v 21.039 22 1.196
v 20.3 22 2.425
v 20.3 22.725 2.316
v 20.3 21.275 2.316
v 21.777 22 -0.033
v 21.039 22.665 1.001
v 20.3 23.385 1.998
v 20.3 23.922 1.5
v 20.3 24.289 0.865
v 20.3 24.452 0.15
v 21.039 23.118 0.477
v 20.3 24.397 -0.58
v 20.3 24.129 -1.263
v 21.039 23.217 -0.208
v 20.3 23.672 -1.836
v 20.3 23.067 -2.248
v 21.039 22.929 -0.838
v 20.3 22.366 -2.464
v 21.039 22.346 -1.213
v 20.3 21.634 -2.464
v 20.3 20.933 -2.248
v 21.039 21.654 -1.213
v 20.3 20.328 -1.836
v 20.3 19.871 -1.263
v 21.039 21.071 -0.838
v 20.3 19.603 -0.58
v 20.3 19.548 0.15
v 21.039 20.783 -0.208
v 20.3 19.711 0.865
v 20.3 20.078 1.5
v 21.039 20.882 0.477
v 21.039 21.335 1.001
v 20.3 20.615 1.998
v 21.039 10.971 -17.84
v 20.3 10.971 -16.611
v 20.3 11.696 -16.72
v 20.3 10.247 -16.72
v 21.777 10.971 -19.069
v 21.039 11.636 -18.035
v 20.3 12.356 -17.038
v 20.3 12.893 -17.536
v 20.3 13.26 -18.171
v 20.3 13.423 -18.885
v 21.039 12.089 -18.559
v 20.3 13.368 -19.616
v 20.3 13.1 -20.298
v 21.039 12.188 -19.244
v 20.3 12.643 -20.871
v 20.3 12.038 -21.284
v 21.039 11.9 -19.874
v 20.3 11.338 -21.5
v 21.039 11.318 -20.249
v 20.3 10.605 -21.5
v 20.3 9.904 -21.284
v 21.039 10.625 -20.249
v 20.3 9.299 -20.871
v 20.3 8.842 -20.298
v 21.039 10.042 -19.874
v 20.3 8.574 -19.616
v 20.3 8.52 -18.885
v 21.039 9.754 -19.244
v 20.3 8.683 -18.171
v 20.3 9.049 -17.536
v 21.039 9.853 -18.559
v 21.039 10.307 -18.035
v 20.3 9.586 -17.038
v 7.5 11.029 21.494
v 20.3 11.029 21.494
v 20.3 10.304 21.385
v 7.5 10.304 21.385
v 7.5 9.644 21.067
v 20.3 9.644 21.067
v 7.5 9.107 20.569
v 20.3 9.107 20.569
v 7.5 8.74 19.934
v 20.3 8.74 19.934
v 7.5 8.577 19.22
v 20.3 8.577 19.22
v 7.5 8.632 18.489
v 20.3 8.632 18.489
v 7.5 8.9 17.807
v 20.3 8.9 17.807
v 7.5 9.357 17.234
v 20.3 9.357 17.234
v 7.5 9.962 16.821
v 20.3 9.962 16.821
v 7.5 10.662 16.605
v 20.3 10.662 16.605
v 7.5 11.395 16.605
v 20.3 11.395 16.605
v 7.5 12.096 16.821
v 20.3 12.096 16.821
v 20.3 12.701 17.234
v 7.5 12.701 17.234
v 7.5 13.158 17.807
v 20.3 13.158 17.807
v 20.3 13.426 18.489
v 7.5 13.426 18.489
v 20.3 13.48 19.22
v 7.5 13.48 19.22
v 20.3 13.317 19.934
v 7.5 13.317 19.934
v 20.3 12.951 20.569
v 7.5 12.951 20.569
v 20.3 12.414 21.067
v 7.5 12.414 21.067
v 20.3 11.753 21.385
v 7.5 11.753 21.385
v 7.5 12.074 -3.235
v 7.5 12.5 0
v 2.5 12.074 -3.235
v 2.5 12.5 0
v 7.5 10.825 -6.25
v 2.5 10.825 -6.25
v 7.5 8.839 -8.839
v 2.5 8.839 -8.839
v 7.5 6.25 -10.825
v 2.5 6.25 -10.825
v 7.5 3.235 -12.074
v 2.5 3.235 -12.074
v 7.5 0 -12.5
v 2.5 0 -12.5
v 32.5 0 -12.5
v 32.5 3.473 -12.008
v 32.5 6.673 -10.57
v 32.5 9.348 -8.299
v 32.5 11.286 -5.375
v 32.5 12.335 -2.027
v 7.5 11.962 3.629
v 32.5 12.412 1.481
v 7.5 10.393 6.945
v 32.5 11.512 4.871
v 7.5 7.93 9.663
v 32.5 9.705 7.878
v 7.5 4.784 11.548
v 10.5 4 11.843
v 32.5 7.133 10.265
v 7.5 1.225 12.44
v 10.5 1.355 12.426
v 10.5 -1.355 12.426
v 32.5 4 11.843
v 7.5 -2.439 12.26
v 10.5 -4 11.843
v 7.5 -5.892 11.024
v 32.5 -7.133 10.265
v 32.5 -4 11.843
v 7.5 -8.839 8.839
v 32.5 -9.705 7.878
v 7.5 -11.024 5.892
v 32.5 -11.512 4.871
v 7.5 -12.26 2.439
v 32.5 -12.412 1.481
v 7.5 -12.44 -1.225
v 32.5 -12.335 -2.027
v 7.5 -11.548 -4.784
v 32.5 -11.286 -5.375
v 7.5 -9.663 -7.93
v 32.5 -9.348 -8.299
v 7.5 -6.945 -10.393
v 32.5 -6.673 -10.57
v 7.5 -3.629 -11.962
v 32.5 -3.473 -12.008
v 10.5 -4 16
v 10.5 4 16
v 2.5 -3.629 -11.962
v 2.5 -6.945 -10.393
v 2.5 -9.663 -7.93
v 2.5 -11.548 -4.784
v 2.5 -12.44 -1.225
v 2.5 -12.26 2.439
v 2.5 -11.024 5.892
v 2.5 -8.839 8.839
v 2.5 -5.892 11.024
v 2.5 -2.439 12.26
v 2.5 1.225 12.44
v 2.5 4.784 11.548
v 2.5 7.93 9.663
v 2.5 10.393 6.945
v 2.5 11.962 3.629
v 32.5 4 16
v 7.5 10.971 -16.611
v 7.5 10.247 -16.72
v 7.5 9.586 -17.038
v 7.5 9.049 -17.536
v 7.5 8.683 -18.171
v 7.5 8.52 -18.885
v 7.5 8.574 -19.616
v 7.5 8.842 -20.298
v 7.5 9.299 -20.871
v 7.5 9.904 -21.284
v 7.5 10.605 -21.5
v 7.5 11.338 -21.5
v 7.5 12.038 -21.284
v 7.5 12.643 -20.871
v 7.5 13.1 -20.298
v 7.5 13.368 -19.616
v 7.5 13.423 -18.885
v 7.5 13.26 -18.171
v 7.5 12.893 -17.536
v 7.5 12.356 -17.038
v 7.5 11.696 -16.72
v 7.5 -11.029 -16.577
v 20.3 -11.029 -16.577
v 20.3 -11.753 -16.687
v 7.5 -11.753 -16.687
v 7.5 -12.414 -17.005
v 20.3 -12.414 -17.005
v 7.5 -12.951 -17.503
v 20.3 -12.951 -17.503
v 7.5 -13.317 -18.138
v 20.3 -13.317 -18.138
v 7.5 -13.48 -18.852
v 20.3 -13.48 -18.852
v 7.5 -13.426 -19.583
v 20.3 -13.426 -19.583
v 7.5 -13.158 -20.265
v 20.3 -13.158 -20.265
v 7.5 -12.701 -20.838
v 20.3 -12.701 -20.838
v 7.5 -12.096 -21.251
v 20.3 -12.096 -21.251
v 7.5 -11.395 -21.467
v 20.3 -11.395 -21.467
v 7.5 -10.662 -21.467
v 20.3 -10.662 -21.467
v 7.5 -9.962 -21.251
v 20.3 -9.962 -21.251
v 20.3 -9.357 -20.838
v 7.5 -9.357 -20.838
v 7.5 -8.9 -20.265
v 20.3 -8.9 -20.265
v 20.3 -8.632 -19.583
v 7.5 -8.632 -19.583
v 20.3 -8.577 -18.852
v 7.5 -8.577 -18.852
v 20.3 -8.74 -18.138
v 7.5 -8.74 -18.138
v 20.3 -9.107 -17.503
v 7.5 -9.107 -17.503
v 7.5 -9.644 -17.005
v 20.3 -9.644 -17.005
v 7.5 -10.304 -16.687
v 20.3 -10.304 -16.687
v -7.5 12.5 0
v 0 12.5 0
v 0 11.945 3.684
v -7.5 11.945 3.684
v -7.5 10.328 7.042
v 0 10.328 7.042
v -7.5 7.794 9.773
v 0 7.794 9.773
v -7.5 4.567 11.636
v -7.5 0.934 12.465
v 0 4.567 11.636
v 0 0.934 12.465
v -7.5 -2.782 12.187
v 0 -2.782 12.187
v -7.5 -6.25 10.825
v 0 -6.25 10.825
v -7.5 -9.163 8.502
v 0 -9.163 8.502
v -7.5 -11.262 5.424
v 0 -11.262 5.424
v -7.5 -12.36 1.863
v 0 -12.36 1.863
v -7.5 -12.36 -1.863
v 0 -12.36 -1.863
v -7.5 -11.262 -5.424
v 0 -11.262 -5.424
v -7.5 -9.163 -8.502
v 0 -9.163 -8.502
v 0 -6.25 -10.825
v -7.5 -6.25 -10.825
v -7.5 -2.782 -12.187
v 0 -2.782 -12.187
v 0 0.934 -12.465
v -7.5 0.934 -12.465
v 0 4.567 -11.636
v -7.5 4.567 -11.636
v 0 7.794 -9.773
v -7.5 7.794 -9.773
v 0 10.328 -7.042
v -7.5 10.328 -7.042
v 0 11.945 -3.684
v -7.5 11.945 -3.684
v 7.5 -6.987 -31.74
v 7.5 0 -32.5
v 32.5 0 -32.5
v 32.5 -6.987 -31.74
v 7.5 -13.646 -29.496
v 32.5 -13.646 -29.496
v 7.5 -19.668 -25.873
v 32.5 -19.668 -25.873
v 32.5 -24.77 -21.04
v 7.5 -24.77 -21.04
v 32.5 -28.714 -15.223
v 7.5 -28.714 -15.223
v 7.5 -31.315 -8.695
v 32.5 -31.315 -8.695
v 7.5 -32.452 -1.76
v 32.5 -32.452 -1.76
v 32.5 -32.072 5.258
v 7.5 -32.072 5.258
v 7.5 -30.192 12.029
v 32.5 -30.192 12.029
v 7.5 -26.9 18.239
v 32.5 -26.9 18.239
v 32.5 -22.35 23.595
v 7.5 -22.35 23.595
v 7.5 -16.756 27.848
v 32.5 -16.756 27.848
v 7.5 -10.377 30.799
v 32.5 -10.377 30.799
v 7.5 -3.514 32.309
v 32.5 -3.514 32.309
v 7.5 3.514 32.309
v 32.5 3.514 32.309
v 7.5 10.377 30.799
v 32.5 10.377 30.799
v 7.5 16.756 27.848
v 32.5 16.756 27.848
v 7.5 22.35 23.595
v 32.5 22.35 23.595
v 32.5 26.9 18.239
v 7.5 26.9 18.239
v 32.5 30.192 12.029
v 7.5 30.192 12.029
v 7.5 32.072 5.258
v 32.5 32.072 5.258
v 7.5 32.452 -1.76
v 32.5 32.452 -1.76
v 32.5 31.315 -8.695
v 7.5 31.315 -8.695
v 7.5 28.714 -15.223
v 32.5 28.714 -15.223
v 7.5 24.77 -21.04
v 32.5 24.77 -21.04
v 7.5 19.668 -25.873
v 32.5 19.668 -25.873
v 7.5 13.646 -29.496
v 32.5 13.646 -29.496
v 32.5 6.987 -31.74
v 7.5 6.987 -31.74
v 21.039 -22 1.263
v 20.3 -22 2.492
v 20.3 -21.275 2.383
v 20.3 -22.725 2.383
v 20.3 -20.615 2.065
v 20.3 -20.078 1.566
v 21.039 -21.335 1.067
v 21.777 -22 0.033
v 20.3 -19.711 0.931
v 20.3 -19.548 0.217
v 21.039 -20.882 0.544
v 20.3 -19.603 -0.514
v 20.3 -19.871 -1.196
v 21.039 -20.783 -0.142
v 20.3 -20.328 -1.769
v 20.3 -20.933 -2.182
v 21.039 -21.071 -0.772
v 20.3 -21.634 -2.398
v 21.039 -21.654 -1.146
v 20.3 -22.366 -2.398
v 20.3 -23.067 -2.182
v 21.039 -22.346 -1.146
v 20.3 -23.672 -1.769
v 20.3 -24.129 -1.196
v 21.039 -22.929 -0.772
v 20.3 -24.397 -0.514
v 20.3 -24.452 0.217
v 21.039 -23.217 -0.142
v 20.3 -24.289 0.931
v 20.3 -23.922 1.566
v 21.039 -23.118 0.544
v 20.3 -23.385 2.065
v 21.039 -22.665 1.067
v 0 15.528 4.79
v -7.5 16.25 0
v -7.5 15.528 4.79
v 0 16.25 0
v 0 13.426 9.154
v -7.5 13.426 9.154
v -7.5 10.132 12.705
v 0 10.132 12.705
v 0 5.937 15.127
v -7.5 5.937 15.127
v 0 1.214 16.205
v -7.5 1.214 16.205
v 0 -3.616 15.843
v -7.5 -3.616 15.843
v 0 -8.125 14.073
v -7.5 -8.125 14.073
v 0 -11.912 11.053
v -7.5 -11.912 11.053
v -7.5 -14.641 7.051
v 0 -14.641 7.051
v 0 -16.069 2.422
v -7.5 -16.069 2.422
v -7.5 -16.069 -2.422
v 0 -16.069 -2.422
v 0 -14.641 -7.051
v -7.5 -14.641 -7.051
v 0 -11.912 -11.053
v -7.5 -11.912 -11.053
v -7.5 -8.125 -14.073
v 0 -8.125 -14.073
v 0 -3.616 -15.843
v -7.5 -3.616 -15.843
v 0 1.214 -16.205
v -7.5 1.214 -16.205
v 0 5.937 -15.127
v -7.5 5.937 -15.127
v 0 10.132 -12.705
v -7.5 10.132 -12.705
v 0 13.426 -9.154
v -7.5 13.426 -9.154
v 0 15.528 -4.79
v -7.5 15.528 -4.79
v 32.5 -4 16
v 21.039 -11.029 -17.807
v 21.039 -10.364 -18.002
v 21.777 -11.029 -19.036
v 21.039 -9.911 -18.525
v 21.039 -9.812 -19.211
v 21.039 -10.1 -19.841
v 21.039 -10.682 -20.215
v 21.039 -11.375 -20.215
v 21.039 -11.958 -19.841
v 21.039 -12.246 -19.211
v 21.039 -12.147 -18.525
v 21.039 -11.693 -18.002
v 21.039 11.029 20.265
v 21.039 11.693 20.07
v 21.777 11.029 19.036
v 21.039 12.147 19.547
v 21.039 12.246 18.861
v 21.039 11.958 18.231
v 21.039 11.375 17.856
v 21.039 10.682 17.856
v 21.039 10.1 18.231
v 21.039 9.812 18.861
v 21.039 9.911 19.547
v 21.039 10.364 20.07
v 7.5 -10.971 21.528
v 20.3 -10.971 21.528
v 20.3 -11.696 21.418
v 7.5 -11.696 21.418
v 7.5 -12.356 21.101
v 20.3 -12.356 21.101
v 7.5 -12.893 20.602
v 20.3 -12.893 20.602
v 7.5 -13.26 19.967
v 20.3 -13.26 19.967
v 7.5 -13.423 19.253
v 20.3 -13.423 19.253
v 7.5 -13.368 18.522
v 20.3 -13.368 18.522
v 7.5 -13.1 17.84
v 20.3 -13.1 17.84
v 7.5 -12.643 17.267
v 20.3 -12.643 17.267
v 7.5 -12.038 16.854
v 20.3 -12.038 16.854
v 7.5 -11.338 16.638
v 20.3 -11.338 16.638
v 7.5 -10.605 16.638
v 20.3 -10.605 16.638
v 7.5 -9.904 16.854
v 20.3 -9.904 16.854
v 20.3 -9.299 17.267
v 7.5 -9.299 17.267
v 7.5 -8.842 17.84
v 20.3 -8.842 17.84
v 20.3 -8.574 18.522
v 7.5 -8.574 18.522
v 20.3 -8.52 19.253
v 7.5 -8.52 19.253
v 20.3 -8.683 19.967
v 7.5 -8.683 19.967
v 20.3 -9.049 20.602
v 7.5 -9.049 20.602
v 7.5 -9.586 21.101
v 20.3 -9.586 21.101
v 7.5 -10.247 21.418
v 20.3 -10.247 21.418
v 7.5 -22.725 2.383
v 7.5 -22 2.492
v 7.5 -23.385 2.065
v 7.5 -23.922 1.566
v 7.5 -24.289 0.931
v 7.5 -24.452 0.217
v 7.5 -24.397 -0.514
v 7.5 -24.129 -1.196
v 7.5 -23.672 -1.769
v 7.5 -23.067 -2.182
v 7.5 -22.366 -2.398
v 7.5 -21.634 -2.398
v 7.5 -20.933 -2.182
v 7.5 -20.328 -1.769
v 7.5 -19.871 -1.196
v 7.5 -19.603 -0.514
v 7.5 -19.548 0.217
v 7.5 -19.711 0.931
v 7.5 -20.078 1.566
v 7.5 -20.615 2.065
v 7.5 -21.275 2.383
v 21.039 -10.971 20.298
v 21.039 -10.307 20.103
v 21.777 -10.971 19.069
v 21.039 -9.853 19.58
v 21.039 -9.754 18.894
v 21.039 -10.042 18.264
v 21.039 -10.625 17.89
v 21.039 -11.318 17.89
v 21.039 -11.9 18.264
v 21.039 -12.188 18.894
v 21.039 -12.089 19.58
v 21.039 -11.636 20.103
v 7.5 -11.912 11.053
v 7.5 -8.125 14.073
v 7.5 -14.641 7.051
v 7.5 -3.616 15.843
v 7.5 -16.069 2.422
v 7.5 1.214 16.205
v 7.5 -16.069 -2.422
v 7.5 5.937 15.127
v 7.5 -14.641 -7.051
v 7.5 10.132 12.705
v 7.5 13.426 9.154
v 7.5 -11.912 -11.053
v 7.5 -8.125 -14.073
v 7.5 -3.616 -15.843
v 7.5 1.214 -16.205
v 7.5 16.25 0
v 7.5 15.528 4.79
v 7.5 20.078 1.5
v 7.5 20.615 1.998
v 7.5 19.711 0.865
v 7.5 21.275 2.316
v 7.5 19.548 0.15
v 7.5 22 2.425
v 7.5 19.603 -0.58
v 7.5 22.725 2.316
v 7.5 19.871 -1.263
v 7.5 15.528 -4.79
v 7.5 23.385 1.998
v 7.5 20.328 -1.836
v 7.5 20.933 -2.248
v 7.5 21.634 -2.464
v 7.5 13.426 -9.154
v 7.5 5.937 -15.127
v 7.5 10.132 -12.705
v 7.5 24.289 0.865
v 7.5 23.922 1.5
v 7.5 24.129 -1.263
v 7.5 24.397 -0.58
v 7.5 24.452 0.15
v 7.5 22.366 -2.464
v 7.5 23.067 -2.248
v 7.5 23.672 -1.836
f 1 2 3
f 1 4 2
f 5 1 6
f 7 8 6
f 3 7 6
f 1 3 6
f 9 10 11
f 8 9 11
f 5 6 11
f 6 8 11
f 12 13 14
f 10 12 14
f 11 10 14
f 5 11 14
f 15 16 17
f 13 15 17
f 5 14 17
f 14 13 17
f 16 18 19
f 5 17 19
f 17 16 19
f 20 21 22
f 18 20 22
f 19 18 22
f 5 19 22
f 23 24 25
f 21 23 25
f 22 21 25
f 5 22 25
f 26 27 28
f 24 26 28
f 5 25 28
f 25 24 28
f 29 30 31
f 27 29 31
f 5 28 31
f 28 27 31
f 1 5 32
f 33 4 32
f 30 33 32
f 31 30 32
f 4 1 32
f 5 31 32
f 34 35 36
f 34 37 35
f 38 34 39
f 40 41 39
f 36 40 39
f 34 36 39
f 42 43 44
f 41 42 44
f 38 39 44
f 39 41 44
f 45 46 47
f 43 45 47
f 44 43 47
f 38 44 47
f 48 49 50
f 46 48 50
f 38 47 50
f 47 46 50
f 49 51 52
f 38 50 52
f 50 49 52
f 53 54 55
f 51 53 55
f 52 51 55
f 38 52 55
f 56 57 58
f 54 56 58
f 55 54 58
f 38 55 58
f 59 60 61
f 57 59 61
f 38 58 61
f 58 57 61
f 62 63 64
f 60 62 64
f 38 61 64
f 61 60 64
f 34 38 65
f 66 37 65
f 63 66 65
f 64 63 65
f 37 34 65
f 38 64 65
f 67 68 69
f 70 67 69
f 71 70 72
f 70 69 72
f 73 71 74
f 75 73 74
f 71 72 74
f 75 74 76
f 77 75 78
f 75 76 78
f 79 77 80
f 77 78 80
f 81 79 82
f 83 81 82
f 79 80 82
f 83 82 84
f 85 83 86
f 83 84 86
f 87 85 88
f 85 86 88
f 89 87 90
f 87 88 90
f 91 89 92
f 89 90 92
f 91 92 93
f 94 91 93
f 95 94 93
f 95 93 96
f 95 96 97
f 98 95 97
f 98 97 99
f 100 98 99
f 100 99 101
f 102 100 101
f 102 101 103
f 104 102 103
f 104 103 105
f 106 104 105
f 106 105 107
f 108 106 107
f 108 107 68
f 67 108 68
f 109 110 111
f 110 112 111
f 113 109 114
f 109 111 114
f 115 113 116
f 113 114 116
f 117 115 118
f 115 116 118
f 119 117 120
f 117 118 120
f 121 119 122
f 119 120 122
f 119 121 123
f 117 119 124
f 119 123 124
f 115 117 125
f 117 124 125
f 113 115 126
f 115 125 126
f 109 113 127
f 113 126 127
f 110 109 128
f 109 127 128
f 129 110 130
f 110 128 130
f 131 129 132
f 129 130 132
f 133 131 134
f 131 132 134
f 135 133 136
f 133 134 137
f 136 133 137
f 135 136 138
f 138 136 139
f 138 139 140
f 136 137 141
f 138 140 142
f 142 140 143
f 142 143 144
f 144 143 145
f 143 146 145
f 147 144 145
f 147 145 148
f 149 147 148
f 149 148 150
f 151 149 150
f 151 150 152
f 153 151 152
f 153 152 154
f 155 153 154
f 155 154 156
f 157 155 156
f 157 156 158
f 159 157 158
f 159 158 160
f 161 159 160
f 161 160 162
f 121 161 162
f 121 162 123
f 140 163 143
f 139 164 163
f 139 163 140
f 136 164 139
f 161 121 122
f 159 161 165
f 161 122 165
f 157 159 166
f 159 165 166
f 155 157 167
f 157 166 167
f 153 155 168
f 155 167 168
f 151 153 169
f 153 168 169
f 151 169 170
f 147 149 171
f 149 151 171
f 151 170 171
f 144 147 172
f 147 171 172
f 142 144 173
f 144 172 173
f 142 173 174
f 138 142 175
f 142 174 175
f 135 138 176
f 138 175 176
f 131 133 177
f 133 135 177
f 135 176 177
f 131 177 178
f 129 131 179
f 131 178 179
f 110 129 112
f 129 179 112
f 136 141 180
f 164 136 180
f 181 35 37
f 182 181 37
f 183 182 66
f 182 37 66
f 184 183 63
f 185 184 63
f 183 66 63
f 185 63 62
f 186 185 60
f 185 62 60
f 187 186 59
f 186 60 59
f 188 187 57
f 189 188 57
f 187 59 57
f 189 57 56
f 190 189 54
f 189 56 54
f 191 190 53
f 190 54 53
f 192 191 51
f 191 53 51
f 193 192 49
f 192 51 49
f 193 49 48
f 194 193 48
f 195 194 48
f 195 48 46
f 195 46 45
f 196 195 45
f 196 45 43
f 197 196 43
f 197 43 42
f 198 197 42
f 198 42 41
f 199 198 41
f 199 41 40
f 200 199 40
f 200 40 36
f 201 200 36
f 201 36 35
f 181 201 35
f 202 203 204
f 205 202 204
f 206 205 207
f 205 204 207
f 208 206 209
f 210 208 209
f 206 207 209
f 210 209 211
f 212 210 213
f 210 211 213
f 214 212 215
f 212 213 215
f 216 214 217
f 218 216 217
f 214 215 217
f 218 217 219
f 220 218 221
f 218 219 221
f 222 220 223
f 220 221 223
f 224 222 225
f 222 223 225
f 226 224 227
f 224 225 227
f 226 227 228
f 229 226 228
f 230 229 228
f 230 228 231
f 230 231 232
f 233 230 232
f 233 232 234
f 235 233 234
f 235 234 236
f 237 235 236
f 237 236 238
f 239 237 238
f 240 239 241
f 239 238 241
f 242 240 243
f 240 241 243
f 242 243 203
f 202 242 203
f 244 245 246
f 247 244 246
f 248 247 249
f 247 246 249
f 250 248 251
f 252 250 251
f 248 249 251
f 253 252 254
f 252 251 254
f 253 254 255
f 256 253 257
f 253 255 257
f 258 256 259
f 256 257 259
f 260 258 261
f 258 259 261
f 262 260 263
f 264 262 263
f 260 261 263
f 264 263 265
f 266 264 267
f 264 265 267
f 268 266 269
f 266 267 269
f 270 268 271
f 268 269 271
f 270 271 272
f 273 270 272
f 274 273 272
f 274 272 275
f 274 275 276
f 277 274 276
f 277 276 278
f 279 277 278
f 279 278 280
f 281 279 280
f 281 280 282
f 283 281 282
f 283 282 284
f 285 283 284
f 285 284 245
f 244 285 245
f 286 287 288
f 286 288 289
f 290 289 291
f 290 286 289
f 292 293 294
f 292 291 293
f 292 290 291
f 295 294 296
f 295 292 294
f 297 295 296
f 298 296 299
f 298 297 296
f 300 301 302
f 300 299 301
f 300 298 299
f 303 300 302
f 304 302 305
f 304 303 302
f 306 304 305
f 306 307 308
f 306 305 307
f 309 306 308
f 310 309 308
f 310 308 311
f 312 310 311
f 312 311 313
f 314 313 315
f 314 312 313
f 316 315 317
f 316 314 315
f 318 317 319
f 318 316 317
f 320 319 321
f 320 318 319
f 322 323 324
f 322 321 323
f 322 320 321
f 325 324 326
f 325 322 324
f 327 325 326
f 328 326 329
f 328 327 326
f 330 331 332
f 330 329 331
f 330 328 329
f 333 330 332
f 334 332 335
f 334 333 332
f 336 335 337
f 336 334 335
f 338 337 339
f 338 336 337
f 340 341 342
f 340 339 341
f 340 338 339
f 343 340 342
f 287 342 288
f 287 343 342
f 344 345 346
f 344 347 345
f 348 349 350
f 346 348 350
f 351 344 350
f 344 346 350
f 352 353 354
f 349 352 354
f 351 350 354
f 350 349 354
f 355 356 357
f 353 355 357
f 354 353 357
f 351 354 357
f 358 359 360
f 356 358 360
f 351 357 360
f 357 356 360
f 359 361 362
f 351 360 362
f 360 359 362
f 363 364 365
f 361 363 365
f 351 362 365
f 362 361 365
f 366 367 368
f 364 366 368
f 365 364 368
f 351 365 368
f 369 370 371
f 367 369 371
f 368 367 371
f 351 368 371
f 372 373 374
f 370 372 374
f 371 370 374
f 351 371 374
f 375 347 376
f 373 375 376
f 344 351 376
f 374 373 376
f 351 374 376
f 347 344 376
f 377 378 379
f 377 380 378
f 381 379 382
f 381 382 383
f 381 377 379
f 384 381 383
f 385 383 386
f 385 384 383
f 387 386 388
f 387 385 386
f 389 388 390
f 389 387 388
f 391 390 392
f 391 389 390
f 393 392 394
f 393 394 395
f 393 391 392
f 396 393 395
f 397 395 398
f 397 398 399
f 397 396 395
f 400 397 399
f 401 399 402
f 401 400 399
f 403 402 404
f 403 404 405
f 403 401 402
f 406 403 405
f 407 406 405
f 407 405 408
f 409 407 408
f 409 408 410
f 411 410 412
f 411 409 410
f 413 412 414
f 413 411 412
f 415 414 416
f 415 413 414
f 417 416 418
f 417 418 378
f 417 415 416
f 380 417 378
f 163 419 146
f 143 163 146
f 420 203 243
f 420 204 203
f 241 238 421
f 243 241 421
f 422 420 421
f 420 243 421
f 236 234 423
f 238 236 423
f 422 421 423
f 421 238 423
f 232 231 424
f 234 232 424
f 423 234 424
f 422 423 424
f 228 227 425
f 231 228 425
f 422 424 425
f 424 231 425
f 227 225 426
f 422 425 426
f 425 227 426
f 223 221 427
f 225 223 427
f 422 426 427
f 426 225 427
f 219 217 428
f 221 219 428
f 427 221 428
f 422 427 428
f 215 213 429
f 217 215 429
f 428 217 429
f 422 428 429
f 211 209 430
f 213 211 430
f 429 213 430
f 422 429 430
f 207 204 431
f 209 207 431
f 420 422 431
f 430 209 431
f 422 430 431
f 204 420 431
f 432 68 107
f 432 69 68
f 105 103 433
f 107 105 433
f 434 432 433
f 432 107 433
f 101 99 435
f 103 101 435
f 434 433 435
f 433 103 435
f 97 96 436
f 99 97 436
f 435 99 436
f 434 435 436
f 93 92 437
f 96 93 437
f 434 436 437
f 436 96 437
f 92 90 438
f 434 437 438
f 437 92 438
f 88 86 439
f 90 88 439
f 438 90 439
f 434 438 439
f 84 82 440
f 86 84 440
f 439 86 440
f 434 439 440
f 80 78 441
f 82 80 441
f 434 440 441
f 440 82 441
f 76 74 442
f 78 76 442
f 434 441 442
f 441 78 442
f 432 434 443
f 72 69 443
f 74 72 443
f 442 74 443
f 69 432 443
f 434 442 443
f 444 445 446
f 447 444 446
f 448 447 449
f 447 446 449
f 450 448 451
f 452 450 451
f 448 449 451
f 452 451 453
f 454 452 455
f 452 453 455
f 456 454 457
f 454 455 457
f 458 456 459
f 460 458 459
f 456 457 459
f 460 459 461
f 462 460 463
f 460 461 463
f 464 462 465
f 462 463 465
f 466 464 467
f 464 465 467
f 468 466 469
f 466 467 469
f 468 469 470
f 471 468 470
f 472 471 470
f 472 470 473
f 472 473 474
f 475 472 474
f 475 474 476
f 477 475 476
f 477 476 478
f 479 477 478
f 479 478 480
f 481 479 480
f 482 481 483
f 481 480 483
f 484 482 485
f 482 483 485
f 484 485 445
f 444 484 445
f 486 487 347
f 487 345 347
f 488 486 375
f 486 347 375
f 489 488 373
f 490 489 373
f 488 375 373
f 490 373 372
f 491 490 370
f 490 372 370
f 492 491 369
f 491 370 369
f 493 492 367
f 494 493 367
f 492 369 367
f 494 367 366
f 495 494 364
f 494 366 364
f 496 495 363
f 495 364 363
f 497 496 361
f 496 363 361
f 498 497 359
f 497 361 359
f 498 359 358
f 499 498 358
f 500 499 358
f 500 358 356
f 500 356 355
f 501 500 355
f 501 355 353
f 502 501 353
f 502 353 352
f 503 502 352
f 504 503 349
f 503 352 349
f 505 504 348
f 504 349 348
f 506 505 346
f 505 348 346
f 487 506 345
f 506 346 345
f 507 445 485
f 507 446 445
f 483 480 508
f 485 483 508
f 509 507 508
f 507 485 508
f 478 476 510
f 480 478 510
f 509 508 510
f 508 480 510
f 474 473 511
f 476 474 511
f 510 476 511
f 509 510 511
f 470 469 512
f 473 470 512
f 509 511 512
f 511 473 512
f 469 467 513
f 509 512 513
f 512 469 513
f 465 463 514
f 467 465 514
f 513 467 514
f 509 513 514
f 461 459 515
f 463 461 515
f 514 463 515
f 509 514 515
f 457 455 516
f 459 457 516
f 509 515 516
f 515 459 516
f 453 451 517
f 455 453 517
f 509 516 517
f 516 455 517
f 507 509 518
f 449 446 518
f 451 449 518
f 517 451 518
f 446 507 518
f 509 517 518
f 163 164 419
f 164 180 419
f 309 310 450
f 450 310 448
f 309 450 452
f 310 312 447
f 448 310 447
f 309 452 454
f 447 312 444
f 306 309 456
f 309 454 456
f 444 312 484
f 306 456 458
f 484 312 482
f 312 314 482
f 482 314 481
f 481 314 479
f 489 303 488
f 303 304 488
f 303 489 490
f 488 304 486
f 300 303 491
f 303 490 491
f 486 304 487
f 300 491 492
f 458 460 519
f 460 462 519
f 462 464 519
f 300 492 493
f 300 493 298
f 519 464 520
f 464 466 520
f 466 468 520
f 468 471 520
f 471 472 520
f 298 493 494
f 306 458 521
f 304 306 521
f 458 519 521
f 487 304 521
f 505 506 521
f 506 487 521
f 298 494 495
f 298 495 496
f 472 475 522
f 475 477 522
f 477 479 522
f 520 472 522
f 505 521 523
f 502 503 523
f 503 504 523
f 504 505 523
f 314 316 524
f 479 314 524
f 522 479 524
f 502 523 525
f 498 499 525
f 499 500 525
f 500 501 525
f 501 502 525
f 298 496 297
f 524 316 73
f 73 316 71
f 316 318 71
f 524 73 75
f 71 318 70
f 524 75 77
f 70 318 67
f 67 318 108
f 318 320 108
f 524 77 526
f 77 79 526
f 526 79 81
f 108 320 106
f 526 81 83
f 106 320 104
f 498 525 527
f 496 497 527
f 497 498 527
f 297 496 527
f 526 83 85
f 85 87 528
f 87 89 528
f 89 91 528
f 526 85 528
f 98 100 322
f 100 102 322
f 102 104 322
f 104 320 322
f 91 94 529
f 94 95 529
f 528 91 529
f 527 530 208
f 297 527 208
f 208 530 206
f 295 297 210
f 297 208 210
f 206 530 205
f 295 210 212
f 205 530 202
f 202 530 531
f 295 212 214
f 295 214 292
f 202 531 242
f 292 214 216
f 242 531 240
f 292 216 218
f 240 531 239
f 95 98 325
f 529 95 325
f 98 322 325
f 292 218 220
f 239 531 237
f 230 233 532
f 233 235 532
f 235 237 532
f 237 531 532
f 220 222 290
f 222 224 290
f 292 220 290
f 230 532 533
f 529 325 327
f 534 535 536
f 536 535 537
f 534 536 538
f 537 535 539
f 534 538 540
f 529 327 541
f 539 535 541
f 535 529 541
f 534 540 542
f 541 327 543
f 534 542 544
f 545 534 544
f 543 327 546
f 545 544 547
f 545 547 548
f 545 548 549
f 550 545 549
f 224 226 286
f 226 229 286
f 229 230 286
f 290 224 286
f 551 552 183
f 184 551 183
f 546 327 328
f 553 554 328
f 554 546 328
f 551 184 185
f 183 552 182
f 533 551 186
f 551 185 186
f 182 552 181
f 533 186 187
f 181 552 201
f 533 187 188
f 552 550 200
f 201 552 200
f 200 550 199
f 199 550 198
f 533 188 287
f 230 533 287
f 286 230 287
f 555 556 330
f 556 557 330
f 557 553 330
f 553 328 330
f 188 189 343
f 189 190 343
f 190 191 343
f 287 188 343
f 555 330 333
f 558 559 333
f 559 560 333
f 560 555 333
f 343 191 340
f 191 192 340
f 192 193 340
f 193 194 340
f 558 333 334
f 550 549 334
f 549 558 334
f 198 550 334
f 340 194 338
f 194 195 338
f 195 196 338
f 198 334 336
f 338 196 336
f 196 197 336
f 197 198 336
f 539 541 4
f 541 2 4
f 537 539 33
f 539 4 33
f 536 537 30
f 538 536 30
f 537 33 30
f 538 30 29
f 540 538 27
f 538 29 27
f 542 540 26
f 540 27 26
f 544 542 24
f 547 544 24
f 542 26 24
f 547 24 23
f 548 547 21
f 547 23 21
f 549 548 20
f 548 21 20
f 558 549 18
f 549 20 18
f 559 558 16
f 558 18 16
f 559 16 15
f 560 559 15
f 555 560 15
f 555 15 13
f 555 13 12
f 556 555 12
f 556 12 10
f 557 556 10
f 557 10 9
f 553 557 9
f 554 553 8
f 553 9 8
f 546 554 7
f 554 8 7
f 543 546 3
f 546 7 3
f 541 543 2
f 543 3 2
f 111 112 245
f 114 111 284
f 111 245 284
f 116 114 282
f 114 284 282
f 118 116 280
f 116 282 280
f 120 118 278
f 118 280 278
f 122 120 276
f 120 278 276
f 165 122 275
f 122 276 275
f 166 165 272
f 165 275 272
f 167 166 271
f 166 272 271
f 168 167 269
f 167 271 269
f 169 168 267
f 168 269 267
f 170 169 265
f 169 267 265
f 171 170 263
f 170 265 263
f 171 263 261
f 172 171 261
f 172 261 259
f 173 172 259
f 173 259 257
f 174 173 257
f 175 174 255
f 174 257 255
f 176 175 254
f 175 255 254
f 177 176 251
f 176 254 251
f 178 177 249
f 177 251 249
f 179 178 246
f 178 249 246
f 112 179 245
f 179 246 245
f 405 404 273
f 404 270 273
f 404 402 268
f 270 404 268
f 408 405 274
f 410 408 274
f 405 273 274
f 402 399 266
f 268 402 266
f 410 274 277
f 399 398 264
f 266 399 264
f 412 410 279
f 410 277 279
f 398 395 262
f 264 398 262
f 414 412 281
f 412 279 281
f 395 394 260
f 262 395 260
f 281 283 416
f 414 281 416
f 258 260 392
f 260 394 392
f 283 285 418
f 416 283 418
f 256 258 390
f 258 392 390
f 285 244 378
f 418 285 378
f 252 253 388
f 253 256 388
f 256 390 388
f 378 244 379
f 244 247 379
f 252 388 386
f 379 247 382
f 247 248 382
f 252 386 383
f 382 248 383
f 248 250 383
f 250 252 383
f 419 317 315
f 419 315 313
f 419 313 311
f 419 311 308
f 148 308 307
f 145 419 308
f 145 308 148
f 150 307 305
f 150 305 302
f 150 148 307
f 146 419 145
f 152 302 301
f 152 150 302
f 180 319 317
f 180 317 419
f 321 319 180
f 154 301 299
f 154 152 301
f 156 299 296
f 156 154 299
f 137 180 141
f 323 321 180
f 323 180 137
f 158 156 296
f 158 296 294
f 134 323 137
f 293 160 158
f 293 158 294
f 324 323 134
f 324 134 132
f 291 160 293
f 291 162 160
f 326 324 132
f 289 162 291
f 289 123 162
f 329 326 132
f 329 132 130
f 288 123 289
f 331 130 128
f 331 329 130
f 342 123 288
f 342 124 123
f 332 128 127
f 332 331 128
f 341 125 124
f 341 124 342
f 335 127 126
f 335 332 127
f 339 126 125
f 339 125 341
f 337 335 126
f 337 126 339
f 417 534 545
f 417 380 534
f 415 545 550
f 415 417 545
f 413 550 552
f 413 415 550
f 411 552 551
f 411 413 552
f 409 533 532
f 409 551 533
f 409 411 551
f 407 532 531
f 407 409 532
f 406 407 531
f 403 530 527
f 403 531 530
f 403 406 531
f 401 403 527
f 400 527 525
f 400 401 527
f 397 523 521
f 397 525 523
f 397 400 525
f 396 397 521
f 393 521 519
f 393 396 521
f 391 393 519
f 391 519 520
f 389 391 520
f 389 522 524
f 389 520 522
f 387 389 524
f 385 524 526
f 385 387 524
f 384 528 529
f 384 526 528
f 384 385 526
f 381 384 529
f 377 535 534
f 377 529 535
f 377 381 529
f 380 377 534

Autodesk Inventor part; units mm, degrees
ref_plane "YZ Plane" through (0, 0, 0) normal (1, 0, 0) x (0, 1, 0)
ref_plane "XZ Plane" through (0, 0, 0) normal (0, 1, 0) x (-1, 0, 0)
ref_plane "XY Plane" through (0, 0, 0) normal (0, 0, 1) x (1, 0, 0)
sketch "Skizze1" plane through (0, 0, 0) normal (1, 0, 0) x (0, 1, 0)
  circle A0 centre (0, 0) radius 12.5
  circle A1 centre (0, 0) radius 16.25
  dimension "d0" = 25
  dimension "d1" = 32.5
extrude "Extrusion1" add sketch "Skizze1" along normal mid plane 15
sketch "Skizze2" plane through (7.5, 0, 0) normal (1, 0, 0) x (0, 0, -1)
  circle A0 centre (0, 0) radius 32.5
  dimension "d5" = 65
extrude "Extrusion2" add sketch "Skizze2" along normal blind 25
sketch "Skizze4" plane through (32.5, 0, 0) normal (1, 0, 0) x (0, 0, -1)
  circle A0 centre (0, 0) radius 12.5
  dimension "d8" = 25
extrude "Extrusion3" cut sketch "Skizze4" against normal blind 30
sketch "Skizze5" plane through (7.5, 0, 0) normal (-1, 0, 0) x (0, 0, 1)
  point P0 (0, 0)
  point P1 (0.0333, -22)
  point P2 (19.0692, -10.9712)
  point P3 (19.0359, 11.0288)
  point P4 (-0.0333, 22)
  point P5 (-19.0692, 10.9712)
  point P6 (-19.0359, -11.0288)
  dimension "d18" = 22
  dimension "d21" = 360
hole "Bohrung1" at (7.5, -22, 0.0333) at (7.5, -10.9712, 19.0692) at (7.5, 11.0288, 19.0359) at (7.5, 22, -0.0333) at (7.5, 10.9712, -19.0692) at (7.5, -11.0288, -19.0359) direction (1, 0, 0) diameter 4.917 depth 12.8 tip angle 118 thread size "M6x1" class "6H" standard "ISO Metric profile"
sketch "Skizze6" plane through (32.5, 0, 0) normal (1, 0, 0) x (0, 0, -1)
  line L0 (-16, -4) -> (-9, -4)
  line L1 (-9, -4) -> (-9, 4)
  line L2 (-9, 4) -> (-16, 4)
  line L3 (-16, 4) -> (-16, -4)
  circle A0 centre (0, 0) radius 12.5 projected
  line L4 (-16, -4) -> (-9, 4) construction
  line L5 (-9, -4) -> (-16, 4) construction
  point P0 (-12.5, 0)
  point P1 (-11.8427, -4)
  point P2 (-11.8427, 4)
  dimension "d23" = 7
  dimension "d24" = 8
  dimension "d25" = 9
extrude "Extrusion4" cut sketch "Skizze6" against normal blind 22 contours L3 L2 A0 L0
properties part number "Befestigung bremsscheibe"
